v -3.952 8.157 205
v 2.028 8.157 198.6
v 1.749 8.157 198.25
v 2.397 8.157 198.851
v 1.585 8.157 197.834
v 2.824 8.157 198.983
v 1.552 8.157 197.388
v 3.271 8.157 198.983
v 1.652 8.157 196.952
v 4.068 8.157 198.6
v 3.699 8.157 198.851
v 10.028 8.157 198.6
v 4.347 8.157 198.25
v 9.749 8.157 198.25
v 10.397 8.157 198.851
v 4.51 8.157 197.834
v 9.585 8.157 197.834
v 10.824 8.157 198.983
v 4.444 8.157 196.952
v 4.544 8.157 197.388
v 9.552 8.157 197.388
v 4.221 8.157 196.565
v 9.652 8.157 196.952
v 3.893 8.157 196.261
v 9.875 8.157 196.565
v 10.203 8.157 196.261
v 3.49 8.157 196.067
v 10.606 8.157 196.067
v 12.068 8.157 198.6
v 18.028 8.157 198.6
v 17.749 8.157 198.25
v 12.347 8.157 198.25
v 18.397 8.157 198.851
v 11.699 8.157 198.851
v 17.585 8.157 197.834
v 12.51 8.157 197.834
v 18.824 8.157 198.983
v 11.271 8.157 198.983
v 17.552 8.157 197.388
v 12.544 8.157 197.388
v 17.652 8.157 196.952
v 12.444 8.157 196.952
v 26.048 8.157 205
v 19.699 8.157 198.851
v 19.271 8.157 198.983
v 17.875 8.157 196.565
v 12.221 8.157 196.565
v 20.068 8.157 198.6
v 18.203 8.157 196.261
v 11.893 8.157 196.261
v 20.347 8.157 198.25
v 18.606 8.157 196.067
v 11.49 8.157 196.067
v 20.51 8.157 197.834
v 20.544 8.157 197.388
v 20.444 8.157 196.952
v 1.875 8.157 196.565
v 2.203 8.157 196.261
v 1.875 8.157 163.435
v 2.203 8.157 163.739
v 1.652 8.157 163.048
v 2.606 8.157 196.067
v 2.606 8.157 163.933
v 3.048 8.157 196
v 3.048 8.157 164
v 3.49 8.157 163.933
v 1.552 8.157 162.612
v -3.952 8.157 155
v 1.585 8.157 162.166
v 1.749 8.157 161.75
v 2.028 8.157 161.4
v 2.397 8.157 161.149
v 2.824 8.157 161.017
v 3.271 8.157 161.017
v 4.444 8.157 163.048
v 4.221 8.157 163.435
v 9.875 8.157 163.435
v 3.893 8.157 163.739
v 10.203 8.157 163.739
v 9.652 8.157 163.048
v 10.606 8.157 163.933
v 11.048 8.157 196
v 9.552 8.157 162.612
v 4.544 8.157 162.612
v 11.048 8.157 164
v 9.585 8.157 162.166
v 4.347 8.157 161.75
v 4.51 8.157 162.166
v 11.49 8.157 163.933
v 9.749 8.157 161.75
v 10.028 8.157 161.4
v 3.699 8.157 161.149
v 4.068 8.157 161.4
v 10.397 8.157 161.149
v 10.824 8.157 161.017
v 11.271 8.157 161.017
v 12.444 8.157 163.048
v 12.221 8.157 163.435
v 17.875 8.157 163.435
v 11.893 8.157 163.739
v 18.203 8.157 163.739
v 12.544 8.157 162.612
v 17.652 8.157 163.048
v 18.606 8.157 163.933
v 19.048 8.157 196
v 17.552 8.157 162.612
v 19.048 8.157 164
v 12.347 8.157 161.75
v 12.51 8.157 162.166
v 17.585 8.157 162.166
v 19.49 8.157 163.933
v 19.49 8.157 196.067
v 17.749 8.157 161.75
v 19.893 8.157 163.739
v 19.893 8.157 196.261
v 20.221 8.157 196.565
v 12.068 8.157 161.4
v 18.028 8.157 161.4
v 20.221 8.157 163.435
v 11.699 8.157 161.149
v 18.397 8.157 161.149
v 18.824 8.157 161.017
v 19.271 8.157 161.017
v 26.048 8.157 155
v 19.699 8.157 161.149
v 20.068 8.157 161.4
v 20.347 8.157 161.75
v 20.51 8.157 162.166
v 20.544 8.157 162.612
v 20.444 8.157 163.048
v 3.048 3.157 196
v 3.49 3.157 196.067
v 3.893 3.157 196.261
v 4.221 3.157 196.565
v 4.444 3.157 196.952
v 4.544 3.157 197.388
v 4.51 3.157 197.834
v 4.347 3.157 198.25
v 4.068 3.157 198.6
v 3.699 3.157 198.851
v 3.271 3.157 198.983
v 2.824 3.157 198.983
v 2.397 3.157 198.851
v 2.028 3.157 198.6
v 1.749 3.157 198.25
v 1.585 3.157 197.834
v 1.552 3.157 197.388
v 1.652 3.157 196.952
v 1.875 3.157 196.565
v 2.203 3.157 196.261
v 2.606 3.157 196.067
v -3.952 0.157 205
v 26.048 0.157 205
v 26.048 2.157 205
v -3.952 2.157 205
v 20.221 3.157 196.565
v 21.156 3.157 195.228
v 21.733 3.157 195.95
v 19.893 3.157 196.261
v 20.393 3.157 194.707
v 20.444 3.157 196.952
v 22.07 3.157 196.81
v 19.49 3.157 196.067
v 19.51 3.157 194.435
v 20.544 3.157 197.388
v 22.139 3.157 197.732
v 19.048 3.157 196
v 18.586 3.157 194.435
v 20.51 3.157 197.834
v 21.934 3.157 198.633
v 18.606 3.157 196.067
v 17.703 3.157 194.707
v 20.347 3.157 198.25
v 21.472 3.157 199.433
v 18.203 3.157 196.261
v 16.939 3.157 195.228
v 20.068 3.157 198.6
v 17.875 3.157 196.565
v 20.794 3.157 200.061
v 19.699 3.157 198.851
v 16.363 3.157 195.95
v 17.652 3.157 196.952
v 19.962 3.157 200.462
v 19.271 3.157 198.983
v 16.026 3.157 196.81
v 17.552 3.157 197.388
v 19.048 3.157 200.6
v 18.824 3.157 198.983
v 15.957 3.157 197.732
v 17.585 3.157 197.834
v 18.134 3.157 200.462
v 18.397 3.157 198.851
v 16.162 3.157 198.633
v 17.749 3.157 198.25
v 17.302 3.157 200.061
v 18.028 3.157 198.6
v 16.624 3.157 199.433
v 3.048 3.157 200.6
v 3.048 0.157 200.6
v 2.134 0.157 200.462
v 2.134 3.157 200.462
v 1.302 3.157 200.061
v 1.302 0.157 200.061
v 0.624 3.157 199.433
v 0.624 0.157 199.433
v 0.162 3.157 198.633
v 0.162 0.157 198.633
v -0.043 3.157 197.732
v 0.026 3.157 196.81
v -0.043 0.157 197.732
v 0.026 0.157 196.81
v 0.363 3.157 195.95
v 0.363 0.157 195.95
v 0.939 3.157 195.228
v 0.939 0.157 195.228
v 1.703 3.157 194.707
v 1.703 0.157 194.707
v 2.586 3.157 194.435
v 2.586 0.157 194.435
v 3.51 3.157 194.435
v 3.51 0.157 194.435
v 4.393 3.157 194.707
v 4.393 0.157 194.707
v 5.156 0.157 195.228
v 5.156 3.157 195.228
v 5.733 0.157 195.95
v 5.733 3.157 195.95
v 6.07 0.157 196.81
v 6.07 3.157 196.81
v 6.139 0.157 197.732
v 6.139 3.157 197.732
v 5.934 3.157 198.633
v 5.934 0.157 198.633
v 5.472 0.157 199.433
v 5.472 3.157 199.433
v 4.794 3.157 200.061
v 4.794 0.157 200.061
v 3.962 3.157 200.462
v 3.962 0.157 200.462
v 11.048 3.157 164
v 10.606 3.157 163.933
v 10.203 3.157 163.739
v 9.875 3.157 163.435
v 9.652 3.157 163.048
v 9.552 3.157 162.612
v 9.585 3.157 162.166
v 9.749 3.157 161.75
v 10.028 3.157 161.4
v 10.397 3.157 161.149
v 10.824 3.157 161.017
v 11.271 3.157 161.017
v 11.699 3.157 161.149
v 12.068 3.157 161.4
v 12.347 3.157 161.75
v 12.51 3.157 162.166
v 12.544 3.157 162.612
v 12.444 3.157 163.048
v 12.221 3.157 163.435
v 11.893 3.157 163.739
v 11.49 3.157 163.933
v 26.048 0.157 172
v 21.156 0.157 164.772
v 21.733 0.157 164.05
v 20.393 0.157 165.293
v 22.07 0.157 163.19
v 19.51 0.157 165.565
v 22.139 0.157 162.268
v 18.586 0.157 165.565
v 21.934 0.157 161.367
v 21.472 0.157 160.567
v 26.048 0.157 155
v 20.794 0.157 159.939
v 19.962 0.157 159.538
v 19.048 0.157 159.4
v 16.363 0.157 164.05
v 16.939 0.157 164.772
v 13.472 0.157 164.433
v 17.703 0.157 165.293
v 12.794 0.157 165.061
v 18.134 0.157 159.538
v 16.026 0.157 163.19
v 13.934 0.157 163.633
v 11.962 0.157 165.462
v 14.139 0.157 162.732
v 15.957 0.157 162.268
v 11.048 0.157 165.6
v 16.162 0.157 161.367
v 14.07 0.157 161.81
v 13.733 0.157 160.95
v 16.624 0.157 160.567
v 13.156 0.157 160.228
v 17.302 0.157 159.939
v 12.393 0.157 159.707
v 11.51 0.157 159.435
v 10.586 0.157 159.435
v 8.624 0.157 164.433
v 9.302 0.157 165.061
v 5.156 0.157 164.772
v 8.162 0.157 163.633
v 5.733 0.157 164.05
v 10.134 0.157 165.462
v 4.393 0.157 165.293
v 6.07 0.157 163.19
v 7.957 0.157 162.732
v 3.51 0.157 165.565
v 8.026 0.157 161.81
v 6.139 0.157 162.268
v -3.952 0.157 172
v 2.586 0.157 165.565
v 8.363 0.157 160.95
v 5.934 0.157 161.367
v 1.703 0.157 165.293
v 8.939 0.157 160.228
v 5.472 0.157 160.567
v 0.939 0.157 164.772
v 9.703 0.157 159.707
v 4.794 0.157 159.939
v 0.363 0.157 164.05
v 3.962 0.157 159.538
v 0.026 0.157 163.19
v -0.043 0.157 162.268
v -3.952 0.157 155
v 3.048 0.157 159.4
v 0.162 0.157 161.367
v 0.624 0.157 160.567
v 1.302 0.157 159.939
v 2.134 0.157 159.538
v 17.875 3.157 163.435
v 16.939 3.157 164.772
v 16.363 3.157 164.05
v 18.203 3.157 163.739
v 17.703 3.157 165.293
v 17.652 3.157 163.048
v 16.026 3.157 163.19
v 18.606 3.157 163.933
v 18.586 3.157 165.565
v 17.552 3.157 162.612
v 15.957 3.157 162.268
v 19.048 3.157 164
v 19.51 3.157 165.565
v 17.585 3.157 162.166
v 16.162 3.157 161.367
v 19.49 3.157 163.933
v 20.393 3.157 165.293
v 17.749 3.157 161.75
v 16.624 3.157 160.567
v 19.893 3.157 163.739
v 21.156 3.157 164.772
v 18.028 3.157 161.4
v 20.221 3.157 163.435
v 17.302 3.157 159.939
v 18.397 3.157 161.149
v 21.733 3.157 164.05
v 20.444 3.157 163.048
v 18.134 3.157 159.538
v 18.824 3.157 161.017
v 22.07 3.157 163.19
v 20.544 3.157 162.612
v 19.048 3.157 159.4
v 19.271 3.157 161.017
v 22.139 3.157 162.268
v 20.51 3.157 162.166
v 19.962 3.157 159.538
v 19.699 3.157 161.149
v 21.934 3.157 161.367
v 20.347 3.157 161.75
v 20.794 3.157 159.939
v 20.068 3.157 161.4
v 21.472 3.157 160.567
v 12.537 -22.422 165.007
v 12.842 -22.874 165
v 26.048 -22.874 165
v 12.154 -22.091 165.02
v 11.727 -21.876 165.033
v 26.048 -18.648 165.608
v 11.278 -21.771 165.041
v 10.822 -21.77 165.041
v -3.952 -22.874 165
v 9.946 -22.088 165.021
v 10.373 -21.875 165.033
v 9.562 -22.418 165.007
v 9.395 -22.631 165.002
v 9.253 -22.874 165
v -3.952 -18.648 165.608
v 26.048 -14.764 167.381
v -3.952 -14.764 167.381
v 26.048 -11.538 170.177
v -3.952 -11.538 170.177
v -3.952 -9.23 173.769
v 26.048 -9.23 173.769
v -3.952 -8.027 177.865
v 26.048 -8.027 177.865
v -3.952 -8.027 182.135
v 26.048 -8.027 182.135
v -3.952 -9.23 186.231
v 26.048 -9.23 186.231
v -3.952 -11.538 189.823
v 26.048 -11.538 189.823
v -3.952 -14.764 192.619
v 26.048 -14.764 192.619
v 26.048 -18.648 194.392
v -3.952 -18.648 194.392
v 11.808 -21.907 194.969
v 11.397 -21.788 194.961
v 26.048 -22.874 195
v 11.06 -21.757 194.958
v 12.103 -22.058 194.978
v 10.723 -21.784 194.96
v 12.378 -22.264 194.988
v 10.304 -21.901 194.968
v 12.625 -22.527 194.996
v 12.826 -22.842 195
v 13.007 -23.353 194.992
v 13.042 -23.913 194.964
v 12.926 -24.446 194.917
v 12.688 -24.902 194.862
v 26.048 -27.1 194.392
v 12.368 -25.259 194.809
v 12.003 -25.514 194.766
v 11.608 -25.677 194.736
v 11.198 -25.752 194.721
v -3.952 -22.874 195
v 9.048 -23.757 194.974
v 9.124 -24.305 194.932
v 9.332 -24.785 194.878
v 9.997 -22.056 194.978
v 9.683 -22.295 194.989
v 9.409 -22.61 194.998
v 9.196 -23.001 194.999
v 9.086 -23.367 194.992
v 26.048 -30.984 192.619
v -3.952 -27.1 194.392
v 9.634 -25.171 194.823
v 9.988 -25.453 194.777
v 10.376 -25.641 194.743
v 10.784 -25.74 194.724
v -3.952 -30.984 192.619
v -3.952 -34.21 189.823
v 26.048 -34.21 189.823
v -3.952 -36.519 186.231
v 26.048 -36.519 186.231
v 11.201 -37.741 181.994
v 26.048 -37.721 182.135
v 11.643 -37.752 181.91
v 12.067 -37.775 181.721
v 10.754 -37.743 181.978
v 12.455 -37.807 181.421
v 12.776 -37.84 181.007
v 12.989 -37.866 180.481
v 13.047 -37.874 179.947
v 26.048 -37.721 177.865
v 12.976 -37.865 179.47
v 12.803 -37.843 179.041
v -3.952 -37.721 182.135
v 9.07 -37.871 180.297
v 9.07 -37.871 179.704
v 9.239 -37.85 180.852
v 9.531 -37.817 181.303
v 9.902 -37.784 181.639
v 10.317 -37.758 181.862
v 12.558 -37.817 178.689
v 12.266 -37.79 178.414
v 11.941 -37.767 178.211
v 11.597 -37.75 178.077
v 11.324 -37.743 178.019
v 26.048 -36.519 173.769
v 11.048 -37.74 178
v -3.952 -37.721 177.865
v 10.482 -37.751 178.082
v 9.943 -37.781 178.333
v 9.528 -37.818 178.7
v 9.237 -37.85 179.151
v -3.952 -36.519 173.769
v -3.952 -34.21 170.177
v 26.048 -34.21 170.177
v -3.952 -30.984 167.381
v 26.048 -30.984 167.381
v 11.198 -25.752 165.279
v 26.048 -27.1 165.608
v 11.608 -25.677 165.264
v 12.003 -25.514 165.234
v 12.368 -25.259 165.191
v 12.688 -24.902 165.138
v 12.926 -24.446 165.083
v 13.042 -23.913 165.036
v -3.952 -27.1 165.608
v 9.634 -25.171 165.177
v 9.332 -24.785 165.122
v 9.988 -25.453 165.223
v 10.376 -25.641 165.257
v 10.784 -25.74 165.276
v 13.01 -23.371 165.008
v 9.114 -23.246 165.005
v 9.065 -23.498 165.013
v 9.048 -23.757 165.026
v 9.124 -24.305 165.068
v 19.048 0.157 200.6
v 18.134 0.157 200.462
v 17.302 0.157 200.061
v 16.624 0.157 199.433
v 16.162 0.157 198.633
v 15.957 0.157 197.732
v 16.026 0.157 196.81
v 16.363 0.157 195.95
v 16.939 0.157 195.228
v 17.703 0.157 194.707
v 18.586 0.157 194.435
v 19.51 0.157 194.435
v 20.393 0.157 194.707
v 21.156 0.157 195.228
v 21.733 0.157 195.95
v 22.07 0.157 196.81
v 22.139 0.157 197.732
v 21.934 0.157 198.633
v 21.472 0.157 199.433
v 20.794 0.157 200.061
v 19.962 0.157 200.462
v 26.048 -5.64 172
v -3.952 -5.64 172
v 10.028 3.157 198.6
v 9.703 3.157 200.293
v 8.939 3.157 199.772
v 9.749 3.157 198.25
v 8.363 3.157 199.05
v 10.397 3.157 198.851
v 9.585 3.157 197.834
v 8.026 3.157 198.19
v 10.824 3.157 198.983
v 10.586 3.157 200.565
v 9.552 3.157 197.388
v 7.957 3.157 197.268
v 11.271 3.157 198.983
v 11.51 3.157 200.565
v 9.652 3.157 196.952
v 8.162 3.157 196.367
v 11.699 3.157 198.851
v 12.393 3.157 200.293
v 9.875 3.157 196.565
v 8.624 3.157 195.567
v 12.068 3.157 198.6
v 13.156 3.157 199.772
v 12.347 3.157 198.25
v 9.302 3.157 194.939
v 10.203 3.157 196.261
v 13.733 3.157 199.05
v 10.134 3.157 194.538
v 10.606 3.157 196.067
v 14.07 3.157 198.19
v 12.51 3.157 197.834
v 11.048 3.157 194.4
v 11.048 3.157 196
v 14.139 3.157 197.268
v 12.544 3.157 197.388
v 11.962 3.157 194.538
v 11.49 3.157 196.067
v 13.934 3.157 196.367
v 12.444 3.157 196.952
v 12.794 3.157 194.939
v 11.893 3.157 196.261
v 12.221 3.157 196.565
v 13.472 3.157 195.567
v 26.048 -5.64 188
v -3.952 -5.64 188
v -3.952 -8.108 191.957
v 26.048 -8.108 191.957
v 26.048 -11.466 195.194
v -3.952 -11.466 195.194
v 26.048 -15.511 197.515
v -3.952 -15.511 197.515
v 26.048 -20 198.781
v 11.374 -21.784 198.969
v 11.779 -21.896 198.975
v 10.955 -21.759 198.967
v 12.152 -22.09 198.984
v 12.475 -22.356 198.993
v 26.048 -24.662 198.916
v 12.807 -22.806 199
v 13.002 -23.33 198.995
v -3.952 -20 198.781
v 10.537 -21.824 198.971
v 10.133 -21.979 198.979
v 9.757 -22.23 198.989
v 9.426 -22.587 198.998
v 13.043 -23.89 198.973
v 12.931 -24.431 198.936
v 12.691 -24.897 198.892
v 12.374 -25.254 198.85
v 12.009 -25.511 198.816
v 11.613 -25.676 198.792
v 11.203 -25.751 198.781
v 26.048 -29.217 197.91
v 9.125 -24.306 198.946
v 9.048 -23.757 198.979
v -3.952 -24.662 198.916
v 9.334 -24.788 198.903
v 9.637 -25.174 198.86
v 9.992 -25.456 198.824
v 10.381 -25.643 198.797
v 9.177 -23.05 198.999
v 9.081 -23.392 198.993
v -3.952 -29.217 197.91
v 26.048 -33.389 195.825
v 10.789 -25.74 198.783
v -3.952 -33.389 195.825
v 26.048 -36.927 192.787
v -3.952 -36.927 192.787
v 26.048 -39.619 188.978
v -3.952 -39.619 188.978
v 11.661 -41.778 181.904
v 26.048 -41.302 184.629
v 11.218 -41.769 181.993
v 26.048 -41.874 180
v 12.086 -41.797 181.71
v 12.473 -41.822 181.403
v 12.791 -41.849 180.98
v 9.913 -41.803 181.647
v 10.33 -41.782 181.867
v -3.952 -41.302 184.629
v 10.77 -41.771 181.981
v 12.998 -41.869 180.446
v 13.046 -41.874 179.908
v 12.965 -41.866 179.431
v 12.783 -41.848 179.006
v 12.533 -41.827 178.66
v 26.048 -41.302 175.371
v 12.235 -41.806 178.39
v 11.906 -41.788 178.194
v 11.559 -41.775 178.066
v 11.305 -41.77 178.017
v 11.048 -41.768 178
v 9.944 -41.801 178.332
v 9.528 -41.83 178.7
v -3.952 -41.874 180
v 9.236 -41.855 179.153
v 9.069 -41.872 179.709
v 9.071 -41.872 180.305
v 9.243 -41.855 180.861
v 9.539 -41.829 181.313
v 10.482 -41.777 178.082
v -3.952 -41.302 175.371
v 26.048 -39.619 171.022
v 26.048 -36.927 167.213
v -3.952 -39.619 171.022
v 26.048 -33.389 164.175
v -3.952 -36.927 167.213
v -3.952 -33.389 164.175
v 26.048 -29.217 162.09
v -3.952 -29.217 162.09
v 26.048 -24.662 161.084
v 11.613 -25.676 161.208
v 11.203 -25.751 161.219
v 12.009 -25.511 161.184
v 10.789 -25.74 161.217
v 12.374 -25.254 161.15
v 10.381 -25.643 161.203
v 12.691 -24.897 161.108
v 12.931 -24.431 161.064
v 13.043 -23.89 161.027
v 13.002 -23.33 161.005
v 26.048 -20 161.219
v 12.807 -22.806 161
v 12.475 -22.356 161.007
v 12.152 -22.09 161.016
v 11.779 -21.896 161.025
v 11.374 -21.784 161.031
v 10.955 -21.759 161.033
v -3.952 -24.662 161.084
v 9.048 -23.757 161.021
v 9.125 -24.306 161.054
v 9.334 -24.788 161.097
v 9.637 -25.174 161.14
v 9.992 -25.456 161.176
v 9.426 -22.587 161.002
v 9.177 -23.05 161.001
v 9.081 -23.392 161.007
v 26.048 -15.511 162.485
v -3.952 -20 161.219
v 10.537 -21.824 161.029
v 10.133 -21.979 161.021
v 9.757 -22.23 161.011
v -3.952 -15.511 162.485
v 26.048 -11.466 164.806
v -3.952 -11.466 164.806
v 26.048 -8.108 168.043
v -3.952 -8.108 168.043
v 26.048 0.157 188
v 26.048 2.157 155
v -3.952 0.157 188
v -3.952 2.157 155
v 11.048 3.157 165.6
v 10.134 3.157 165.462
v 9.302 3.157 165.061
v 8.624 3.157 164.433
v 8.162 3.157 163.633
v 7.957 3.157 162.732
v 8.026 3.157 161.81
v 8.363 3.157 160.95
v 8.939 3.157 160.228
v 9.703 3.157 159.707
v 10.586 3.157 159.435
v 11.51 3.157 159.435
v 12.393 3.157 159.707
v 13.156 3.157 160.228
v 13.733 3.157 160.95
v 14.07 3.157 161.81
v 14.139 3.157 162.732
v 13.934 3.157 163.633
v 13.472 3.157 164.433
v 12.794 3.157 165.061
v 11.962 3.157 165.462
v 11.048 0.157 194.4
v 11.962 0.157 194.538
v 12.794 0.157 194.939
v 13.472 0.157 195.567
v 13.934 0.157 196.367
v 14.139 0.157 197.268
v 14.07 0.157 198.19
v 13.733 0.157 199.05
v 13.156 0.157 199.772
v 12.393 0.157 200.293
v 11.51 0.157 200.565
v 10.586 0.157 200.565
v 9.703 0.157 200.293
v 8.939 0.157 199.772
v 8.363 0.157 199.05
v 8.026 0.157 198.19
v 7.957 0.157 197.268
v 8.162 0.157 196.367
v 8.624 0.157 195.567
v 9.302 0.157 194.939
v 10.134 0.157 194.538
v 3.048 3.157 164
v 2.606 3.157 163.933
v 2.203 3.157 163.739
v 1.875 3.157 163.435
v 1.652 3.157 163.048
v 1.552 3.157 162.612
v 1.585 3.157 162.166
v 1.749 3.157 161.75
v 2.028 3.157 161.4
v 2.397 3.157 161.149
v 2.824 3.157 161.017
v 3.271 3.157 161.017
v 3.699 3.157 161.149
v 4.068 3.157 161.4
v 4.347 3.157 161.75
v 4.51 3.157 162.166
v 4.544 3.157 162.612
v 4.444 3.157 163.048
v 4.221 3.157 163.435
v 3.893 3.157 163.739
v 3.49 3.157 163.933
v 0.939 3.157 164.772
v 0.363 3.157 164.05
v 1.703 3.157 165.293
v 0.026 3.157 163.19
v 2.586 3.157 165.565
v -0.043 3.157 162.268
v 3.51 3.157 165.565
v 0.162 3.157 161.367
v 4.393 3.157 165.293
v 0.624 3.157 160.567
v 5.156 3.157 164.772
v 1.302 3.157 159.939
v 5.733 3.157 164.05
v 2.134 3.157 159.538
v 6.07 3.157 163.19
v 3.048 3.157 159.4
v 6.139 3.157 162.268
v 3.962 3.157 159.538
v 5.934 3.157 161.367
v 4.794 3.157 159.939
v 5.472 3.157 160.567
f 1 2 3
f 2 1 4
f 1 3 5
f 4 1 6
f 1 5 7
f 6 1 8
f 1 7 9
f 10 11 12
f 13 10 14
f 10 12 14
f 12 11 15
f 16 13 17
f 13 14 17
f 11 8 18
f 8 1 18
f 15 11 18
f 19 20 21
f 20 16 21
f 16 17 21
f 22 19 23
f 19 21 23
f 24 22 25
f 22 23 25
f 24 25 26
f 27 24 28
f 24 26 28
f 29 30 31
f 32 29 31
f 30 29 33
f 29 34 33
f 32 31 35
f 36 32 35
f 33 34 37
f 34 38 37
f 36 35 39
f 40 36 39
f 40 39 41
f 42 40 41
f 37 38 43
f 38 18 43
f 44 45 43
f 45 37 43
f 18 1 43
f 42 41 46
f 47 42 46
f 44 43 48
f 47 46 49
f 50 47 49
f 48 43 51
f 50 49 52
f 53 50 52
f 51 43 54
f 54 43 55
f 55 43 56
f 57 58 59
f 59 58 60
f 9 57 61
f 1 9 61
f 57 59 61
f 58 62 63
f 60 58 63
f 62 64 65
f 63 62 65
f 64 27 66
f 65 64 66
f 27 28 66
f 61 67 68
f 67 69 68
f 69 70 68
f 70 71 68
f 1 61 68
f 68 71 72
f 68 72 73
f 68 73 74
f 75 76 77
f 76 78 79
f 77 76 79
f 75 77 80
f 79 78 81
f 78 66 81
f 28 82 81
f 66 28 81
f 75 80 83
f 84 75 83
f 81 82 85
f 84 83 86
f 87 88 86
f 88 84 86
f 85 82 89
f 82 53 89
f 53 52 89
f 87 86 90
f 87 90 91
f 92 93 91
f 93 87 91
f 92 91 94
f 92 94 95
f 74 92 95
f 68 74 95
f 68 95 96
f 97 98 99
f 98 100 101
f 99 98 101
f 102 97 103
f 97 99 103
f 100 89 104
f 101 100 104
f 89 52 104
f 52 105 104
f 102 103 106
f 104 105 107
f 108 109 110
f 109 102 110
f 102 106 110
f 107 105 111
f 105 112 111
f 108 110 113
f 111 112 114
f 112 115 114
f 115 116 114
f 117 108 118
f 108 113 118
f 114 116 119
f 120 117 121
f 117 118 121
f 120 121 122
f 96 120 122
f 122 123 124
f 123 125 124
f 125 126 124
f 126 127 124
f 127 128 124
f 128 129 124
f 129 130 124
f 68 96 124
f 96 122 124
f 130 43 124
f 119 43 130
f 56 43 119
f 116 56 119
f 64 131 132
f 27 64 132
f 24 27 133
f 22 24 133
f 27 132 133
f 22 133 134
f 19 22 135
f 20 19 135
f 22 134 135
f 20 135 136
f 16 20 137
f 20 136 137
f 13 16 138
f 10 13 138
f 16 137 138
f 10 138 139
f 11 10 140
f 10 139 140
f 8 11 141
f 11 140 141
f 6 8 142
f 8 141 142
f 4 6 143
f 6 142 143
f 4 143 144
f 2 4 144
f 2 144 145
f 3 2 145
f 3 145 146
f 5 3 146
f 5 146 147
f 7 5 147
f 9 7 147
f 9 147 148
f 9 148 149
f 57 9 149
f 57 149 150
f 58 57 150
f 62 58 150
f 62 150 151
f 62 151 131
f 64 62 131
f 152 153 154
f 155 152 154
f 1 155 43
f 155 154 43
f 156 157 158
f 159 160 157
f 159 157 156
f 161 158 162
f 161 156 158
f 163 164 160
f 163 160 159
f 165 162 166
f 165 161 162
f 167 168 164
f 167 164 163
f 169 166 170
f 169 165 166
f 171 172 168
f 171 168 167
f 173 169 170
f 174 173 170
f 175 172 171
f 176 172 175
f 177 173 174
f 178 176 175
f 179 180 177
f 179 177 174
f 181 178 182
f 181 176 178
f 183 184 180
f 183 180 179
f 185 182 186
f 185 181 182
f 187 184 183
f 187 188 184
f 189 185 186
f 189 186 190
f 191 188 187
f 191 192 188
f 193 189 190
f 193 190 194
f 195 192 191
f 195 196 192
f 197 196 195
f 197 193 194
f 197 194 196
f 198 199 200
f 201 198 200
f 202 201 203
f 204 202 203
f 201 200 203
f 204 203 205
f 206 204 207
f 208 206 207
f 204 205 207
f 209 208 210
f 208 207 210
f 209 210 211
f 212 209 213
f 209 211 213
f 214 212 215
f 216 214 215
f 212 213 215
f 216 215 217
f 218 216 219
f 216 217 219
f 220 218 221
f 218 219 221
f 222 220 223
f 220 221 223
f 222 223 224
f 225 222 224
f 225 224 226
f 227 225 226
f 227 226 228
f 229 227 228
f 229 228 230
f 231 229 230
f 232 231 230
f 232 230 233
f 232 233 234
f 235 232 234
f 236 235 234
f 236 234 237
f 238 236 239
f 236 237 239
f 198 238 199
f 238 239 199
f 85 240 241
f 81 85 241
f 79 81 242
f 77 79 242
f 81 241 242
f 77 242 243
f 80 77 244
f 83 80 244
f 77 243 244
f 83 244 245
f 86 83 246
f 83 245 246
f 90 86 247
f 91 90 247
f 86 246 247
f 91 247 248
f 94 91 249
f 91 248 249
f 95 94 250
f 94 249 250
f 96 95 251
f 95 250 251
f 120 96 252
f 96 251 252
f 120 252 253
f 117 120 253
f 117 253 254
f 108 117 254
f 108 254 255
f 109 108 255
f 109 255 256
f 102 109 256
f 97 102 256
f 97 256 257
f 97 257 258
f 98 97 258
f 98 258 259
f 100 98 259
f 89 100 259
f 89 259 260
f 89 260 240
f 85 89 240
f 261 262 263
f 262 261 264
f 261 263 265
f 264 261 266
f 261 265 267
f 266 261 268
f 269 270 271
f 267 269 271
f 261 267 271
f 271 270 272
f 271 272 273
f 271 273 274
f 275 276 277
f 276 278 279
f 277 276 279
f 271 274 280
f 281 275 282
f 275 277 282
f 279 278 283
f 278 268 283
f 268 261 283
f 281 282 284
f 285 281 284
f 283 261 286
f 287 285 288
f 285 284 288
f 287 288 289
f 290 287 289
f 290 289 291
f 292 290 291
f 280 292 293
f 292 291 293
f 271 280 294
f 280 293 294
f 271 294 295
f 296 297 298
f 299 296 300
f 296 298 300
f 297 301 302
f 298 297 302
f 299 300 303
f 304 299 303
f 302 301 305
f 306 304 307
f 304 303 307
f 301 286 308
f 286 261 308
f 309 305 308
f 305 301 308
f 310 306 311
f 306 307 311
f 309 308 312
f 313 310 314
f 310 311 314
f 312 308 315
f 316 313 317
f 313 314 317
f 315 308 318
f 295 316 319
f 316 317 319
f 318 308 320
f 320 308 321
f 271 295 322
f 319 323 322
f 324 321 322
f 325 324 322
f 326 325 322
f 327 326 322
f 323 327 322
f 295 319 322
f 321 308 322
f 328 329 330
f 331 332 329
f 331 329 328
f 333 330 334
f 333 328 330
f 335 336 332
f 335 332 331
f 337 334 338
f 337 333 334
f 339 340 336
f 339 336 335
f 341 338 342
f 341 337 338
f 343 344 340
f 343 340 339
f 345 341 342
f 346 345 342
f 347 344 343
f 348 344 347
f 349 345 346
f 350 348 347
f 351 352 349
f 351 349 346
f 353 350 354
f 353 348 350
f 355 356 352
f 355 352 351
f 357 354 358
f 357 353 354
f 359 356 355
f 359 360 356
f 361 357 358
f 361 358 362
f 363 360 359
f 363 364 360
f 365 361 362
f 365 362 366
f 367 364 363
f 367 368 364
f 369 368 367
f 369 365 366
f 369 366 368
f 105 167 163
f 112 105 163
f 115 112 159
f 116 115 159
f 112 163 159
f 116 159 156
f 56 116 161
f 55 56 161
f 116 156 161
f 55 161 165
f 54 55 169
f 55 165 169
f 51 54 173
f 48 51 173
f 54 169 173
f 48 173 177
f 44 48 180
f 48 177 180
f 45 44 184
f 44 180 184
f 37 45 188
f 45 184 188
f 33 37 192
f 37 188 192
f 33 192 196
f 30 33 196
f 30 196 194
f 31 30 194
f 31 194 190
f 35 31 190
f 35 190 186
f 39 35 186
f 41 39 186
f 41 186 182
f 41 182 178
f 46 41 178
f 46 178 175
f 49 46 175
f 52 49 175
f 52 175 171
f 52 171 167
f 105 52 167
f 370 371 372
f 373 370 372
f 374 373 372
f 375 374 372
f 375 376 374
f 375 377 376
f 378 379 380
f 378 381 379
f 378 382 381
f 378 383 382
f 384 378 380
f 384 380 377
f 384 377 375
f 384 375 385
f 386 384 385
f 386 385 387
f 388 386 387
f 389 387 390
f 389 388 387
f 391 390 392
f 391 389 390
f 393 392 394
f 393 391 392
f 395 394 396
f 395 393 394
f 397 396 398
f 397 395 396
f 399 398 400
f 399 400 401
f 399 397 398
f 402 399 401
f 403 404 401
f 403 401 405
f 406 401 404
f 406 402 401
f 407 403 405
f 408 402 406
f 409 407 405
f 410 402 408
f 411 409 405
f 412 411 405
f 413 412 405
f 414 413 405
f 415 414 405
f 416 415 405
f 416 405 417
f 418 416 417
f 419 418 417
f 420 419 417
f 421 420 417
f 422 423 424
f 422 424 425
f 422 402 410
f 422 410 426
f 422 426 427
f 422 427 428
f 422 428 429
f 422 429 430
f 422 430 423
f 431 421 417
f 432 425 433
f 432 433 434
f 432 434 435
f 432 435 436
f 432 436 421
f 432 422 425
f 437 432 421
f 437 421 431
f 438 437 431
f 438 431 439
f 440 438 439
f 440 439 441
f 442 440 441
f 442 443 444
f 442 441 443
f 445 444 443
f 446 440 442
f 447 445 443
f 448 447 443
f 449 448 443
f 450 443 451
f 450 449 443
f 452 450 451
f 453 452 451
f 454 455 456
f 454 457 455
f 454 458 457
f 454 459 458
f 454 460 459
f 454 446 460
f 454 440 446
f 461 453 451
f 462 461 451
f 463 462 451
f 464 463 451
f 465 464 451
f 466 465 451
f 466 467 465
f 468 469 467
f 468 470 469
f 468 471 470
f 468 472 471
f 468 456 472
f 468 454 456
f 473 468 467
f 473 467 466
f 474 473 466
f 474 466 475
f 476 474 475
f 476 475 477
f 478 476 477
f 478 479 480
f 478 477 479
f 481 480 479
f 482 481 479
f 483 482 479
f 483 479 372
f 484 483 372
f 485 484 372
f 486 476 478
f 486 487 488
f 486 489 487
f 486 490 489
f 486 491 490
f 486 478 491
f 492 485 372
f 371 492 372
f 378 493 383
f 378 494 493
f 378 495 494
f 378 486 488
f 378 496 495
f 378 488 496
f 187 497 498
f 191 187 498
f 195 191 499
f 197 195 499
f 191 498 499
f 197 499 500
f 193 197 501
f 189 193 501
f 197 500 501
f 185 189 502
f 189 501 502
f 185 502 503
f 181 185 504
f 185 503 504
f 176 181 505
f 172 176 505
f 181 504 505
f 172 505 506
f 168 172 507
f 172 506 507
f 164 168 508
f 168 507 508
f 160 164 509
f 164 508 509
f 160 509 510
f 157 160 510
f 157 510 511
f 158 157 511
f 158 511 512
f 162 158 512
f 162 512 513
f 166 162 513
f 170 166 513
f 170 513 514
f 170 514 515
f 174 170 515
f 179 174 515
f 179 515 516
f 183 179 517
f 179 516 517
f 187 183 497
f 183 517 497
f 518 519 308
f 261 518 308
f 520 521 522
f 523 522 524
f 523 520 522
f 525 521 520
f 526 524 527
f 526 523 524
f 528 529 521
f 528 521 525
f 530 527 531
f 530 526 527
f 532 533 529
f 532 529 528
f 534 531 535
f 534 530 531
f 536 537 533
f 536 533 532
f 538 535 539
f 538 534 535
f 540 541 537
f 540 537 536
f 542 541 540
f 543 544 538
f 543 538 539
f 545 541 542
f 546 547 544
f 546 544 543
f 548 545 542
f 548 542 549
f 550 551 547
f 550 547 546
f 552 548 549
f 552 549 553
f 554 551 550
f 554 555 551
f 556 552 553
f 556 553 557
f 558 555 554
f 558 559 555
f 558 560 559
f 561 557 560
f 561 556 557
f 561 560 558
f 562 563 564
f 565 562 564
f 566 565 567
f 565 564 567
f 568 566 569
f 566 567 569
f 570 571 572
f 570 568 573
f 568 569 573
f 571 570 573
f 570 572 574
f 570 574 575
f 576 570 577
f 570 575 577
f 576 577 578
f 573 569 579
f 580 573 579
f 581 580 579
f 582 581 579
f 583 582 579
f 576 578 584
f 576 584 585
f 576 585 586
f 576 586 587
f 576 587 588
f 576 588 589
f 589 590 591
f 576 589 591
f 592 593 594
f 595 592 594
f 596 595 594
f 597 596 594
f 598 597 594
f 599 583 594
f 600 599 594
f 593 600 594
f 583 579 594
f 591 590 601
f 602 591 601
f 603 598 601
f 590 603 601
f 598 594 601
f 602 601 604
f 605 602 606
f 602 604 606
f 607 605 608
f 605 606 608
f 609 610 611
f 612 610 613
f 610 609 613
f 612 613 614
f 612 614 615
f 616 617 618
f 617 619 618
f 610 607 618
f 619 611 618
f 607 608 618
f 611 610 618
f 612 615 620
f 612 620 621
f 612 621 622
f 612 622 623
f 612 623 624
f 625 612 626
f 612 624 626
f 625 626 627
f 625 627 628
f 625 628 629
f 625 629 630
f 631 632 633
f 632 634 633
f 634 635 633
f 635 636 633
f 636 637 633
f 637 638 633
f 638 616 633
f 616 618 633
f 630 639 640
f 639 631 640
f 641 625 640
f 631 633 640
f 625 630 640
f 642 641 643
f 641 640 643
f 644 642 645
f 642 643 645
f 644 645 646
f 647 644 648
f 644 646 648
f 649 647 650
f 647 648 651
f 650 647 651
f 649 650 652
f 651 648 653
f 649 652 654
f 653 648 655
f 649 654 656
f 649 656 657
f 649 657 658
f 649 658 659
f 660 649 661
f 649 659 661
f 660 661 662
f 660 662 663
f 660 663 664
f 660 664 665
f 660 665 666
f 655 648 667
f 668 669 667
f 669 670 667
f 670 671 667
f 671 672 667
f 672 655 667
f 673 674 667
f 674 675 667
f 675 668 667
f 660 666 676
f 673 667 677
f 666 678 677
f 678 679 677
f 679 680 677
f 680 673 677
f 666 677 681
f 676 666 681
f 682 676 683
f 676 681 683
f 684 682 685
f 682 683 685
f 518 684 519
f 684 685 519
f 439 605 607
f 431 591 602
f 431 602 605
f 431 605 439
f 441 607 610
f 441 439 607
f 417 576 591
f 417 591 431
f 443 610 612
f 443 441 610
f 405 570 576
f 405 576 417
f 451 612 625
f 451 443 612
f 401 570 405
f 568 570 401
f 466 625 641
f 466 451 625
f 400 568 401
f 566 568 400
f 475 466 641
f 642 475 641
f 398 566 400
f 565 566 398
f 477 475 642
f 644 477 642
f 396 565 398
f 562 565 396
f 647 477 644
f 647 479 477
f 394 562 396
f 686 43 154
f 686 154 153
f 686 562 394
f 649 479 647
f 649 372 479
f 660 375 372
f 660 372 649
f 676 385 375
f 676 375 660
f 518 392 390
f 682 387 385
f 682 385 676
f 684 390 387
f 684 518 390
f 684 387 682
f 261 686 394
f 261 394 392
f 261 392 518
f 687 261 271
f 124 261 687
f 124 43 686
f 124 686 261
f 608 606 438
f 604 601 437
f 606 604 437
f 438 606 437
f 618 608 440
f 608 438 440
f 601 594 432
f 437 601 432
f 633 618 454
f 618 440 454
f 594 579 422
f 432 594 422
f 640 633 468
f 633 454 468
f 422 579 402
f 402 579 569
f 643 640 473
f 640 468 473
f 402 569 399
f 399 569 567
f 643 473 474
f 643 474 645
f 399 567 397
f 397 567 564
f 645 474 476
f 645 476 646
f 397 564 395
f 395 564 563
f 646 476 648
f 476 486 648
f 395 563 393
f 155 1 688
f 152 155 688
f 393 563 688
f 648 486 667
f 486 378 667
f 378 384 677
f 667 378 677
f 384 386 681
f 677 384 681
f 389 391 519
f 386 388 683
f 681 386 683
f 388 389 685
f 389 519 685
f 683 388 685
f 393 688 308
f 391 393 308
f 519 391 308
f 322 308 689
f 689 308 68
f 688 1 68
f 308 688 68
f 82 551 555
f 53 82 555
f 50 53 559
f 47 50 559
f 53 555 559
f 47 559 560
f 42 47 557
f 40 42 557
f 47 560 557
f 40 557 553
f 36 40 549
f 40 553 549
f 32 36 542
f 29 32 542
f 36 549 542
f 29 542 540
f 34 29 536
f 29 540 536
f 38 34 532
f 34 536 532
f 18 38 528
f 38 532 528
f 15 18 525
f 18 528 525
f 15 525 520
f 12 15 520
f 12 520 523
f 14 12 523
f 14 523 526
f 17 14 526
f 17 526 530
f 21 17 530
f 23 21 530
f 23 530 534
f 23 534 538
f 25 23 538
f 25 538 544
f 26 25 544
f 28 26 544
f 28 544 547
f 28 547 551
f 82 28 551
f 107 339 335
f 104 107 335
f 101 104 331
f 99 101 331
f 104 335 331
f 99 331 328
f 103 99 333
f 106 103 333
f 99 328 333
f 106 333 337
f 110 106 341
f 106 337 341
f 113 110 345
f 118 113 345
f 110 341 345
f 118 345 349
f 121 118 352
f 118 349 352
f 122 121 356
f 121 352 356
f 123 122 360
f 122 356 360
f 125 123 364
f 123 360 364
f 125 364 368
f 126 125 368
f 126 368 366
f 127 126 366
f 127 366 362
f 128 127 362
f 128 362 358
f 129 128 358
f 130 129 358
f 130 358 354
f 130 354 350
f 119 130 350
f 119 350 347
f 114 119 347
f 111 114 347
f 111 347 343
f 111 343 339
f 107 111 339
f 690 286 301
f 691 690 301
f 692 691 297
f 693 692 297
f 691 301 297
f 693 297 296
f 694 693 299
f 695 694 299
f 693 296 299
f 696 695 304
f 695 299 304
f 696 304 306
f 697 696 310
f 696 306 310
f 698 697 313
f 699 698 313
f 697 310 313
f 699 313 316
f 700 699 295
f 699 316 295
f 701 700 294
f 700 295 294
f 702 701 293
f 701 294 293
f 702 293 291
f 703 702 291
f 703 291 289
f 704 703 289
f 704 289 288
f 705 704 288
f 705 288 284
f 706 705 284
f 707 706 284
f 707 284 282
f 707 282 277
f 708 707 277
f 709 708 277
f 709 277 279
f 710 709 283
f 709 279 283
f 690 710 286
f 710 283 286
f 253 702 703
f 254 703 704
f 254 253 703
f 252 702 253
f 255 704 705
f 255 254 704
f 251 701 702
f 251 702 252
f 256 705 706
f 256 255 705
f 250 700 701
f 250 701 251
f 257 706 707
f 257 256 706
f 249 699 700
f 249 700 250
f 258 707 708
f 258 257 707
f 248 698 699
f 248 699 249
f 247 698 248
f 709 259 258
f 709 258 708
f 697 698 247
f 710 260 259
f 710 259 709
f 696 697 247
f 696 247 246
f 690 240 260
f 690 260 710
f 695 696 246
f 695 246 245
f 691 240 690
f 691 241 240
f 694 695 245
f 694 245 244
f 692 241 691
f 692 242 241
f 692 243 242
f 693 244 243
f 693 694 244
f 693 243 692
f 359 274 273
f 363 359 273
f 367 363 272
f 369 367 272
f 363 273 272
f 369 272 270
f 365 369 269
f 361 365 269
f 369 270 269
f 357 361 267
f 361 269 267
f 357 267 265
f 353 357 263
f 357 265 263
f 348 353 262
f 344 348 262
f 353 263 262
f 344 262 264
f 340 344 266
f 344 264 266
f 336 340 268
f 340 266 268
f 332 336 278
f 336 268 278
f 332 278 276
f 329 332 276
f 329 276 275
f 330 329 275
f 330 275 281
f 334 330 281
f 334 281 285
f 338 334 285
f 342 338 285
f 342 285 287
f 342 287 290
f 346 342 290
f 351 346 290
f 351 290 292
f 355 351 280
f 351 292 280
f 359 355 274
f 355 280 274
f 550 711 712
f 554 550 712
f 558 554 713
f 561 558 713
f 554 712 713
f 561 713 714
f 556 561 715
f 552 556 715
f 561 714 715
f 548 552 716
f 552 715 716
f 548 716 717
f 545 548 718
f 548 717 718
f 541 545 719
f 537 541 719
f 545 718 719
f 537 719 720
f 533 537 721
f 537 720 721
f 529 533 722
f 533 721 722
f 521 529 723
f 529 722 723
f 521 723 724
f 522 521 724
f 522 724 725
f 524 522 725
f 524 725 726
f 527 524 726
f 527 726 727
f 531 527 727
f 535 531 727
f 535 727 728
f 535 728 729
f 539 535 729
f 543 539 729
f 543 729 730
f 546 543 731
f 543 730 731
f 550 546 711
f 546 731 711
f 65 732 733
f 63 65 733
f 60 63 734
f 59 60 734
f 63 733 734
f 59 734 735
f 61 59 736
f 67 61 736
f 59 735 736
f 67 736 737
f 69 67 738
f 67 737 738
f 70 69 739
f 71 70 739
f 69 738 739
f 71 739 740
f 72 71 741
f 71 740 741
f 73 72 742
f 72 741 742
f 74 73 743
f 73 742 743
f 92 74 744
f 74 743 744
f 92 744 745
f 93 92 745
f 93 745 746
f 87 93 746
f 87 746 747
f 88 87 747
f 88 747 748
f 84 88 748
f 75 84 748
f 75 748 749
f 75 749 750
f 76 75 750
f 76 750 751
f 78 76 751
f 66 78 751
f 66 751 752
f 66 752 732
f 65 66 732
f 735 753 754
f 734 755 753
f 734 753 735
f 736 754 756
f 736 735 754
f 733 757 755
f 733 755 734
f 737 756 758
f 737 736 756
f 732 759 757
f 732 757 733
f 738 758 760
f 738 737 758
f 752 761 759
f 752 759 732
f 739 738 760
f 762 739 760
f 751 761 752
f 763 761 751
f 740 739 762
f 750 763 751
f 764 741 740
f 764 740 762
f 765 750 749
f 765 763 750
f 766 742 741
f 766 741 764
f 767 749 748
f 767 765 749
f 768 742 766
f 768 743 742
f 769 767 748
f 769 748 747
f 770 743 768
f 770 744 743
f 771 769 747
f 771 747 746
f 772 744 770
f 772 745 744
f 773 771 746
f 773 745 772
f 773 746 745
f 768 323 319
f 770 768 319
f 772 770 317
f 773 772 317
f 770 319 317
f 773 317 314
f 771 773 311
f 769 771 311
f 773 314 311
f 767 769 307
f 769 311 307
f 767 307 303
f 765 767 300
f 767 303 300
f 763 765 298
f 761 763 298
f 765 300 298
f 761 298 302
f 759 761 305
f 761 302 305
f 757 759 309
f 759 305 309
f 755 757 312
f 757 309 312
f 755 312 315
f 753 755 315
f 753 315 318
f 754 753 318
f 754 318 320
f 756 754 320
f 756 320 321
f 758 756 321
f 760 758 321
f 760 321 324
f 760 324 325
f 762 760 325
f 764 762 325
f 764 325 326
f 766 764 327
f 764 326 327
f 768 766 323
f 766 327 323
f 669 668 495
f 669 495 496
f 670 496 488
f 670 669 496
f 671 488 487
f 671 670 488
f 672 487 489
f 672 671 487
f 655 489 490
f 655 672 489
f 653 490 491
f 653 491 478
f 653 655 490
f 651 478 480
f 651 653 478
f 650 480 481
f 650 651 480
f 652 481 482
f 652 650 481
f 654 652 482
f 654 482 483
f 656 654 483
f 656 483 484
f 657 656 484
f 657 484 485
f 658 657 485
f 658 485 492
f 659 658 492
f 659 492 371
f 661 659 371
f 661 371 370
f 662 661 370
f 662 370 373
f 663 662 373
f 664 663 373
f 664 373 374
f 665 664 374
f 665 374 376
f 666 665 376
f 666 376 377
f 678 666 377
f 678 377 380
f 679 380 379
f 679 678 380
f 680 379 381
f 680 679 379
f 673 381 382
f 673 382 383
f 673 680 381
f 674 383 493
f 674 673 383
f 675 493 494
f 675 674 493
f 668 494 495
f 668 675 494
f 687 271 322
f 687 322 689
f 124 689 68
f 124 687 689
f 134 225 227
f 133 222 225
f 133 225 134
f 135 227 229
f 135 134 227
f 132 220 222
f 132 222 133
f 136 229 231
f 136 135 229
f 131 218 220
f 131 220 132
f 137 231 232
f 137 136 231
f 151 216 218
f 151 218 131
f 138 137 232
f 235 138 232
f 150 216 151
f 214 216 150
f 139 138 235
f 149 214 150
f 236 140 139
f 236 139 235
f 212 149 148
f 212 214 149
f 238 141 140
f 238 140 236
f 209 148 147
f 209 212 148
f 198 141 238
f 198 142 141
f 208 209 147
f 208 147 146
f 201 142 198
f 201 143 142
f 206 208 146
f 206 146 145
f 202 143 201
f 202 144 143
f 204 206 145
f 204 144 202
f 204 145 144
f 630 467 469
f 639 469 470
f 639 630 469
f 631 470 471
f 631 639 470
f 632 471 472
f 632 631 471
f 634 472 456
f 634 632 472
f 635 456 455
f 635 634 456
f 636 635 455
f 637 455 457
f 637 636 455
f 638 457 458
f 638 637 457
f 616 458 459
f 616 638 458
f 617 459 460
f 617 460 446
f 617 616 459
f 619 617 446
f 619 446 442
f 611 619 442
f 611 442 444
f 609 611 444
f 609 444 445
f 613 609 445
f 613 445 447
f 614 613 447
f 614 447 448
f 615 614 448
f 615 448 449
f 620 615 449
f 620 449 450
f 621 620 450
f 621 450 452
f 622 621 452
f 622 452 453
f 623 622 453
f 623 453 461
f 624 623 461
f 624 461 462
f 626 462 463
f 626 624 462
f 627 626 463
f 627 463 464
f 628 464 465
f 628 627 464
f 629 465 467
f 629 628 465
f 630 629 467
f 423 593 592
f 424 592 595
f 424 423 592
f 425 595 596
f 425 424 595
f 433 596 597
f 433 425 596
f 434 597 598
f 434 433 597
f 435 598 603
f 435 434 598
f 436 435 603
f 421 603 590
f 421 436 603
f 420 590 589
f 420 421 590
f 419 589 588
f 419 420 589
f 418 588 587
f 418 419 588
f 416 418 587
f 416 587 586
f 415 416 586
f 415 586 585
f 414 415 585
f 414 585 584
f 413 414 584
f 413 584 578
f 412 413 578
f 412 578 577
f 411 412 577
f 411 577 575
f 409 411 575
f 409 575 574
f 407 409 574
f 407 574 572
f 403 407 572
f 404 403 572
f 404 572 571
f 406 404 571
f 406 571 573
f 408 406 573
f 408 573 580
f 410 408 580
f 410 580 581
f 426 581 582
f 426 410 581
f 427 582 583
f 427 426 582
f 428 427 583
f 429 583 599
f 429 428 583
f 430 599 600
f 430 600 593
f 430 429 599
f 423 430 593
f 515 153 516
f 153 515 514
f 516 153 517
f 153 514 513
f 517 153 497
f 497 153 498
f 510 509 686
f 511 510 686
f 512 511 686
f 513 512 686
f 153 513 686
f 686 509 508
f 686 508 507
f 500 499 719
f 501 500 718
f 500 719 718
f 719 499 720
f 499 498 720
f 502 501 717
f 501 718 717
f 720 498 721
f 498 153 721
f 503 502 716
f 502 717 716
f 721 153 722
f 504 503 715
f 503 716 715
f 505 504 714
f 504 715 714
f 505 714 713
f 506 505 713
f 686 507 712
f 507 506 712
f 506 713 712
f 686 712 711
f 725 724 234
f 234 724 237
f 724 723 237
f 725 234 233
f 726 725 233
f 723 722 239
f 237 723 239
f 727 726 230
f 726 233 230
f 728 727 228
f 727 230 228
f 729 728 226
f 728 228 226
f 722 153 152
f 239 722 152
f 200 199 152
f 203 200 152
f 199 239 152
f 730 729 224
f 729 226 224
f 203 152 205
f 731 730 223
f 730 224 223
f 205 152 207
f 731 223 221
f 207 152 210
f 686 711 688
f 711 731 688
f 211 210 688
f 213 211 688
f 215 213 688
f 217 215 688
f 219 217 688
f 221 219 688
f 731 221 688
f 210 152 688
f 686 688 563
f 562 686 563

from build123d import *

# Parameters (mm, degrees)
EXTRUDE_START            = -30
EXTRUDE_1_OUTLINE_R      = 15
EXTRUDE_1_DEPTH          = 30
SKETCH_2_W               = 50.000000035
SKETCH_2_H               = 6
EXTRUDE_2_DEPTH          = 30
SKETCH_3_R               = 1.5
CUT_EXTRUDE_1_DEPTH      = 10
SKETCH_4_R               = 3.1
CUT_EXTRUDE_2_DEPTH      = 3
SKETCH_5_R               = 2
CUT_EXTRUDE_3_DEPTH      = 33
CUT_EXTRUDE_4_DEPTH      = 211.848116868
CUT_EXTRUDE_4_DEPTH_BACK = 211.848116868
SKETCH_6_R               = 2


# Read off the part's stored shape, not the designer's step: 填料-伸長1
with BuildPart() as part:
    # 填料-伸長1 outline → 填料-伸長1 (new body)
    with BuildSketch(Plane(origin=(26.04788271, 0, 0), x_dir=(0, 0, -1), z_dir=(1, 0, 0)).offset(EXTRUDE_START)):
        with BuildLine():
            Line((-188, 0.156954032), (-188, -5.64036342))
            ThreePointArc((-188, -5.64036342), (-180, -41.87405136), (-172, -5.64036342))
            Line((-172, -5.64036342), (-172, 0.156954032))
            Line((-172, 0.156954032), (-155, 0.156954032))
            Line((-155, 0.156954032), (-155, 2.156954032))
            Line((-155, 2.156954032), (-205, 2.156954032))
            Line((-205, 2.156954032), (-205, 0.156954032))
            Line((-205, 0.156954032), (-188, 0.156954032))
        make_face()
        with Locations((-180, -22.87405136)):
            Circle(EXTRUDE_1_OUTLINE_R, mode=Mode.SUBTRACT)
    extrude(amount=EXTRUDE_1_DEPTH)

    # 草圖2 → 填料-伸長2 (add)
    with BuildSketch(Plane(origin=(26.04788271, 0, 0), x_dir=(0, 0, -1), z_dir=(1, 0, 0))):
        with Locations((-179.999999983, 5.156954032)):
            Rectangle(SKETCH_2_W, SKETCH_2_H)
    extrude(amount=-EXTRUDE_2_DEPTH)

    # 草圖3 → 除料-伸長1 (cut)
    with BuildSketch(Plane.XZ.offset(-0.156954032)):
        with Locations(Location((19.04788271, 197.5, 0), (0, 0, 270))):
            Circle(SKETCH_3_R)
        with Locations(Location((19.04788271, 162.5, 0), (0, 0, 90))):
            Circle(SKETCH_3_R)
        with Locations(Location((3.04788271, 197.5, 0), (0, 0, 270))):
            Circle(SKETCH_3_R)
        with Locations(Location((3.04788271, 162.5, 0), (0, 0, 90))):
            Circle(SKETCH_3_R)
        with Locations(Location((11.04788271, 197.5, 0), (0, 0, 270))):
            Circle(SKETCH_3_R)
        with Locations(Location((11.04788271, 162.5, 0), (0, 0, 90))):
            Circle(SKETCH_3_R)
    extrude(amount=-CUT_EXTRUDE_1_DEPTH, mode=Mode.SUBTRACT)

    # 草圖4 → 除料-伸長2 (cut)
    with BuildSketch(Plane.XZ.offset(-0.156954032)):
        with Locations(Location((19.04788271, 162.5, 0), (0, 0, 270))):
            Circle(SKETCH_4_R)
        with Locations(Location((3.04788271, 162.5, 0), (0, 0, 270))):
            Circle(SKETCH_4_R)
        with Locations(Location((3.04788271, 197.5, 0), (0, 0, 90))):
            Circle(SKETCH_4_R)
        with Locations(Location((19.04788271, 197.5, 0), (0, 0, 90))):
            Circle(SKETCH_4_R)
        with Locations(Location((11.04788271, 197.5, 0), (0, 0, 270))):
            Circle(SKETCH_4_R)
        with Locations(Location((11.04788271, 162.5, 0), (0, 0, 90))):
            Circle(SKETCH_4_R)
    extrude(amount=-CUT_EXTRUDE_2_DEPTH, mode=Mode.SUBTRACT)

    # 草圖5 → 除料-伸長3 (cut)
    with BuildSketch(Plane(origin=(0, -50, 0), x_dir=(1, 0, 0), z_dir=(0, 1, 0))):
        with Locations(Location((11.04788271, -180, 0), (0, 0, 90))):
            Circle(SKETCH_5_R)
    extrude(amount=CUT_EXTRUDE_3_DEPTH, mode=Mode.SUBTRACT)

    # 草圖6 → 除料-伸長4 (cut, two sides: drawn at the far end of the back side and taken through both)
    with BuildSketch(Plane.XY.offset(-CUT_EXTRUDE_4_DEPTH_BACK)):
        with Locations(Location((11.04788271, -23.75720739, 0), (0, 0, 180))):
            Circle(SKETCH_6_R)
    extrude(amount=CUT_EXTRUDE_4_DEPTH + CUT_EXTRUDE_4_DEPTH_BACK, mode=Mode.SUBTRACT)


solid = part.part
